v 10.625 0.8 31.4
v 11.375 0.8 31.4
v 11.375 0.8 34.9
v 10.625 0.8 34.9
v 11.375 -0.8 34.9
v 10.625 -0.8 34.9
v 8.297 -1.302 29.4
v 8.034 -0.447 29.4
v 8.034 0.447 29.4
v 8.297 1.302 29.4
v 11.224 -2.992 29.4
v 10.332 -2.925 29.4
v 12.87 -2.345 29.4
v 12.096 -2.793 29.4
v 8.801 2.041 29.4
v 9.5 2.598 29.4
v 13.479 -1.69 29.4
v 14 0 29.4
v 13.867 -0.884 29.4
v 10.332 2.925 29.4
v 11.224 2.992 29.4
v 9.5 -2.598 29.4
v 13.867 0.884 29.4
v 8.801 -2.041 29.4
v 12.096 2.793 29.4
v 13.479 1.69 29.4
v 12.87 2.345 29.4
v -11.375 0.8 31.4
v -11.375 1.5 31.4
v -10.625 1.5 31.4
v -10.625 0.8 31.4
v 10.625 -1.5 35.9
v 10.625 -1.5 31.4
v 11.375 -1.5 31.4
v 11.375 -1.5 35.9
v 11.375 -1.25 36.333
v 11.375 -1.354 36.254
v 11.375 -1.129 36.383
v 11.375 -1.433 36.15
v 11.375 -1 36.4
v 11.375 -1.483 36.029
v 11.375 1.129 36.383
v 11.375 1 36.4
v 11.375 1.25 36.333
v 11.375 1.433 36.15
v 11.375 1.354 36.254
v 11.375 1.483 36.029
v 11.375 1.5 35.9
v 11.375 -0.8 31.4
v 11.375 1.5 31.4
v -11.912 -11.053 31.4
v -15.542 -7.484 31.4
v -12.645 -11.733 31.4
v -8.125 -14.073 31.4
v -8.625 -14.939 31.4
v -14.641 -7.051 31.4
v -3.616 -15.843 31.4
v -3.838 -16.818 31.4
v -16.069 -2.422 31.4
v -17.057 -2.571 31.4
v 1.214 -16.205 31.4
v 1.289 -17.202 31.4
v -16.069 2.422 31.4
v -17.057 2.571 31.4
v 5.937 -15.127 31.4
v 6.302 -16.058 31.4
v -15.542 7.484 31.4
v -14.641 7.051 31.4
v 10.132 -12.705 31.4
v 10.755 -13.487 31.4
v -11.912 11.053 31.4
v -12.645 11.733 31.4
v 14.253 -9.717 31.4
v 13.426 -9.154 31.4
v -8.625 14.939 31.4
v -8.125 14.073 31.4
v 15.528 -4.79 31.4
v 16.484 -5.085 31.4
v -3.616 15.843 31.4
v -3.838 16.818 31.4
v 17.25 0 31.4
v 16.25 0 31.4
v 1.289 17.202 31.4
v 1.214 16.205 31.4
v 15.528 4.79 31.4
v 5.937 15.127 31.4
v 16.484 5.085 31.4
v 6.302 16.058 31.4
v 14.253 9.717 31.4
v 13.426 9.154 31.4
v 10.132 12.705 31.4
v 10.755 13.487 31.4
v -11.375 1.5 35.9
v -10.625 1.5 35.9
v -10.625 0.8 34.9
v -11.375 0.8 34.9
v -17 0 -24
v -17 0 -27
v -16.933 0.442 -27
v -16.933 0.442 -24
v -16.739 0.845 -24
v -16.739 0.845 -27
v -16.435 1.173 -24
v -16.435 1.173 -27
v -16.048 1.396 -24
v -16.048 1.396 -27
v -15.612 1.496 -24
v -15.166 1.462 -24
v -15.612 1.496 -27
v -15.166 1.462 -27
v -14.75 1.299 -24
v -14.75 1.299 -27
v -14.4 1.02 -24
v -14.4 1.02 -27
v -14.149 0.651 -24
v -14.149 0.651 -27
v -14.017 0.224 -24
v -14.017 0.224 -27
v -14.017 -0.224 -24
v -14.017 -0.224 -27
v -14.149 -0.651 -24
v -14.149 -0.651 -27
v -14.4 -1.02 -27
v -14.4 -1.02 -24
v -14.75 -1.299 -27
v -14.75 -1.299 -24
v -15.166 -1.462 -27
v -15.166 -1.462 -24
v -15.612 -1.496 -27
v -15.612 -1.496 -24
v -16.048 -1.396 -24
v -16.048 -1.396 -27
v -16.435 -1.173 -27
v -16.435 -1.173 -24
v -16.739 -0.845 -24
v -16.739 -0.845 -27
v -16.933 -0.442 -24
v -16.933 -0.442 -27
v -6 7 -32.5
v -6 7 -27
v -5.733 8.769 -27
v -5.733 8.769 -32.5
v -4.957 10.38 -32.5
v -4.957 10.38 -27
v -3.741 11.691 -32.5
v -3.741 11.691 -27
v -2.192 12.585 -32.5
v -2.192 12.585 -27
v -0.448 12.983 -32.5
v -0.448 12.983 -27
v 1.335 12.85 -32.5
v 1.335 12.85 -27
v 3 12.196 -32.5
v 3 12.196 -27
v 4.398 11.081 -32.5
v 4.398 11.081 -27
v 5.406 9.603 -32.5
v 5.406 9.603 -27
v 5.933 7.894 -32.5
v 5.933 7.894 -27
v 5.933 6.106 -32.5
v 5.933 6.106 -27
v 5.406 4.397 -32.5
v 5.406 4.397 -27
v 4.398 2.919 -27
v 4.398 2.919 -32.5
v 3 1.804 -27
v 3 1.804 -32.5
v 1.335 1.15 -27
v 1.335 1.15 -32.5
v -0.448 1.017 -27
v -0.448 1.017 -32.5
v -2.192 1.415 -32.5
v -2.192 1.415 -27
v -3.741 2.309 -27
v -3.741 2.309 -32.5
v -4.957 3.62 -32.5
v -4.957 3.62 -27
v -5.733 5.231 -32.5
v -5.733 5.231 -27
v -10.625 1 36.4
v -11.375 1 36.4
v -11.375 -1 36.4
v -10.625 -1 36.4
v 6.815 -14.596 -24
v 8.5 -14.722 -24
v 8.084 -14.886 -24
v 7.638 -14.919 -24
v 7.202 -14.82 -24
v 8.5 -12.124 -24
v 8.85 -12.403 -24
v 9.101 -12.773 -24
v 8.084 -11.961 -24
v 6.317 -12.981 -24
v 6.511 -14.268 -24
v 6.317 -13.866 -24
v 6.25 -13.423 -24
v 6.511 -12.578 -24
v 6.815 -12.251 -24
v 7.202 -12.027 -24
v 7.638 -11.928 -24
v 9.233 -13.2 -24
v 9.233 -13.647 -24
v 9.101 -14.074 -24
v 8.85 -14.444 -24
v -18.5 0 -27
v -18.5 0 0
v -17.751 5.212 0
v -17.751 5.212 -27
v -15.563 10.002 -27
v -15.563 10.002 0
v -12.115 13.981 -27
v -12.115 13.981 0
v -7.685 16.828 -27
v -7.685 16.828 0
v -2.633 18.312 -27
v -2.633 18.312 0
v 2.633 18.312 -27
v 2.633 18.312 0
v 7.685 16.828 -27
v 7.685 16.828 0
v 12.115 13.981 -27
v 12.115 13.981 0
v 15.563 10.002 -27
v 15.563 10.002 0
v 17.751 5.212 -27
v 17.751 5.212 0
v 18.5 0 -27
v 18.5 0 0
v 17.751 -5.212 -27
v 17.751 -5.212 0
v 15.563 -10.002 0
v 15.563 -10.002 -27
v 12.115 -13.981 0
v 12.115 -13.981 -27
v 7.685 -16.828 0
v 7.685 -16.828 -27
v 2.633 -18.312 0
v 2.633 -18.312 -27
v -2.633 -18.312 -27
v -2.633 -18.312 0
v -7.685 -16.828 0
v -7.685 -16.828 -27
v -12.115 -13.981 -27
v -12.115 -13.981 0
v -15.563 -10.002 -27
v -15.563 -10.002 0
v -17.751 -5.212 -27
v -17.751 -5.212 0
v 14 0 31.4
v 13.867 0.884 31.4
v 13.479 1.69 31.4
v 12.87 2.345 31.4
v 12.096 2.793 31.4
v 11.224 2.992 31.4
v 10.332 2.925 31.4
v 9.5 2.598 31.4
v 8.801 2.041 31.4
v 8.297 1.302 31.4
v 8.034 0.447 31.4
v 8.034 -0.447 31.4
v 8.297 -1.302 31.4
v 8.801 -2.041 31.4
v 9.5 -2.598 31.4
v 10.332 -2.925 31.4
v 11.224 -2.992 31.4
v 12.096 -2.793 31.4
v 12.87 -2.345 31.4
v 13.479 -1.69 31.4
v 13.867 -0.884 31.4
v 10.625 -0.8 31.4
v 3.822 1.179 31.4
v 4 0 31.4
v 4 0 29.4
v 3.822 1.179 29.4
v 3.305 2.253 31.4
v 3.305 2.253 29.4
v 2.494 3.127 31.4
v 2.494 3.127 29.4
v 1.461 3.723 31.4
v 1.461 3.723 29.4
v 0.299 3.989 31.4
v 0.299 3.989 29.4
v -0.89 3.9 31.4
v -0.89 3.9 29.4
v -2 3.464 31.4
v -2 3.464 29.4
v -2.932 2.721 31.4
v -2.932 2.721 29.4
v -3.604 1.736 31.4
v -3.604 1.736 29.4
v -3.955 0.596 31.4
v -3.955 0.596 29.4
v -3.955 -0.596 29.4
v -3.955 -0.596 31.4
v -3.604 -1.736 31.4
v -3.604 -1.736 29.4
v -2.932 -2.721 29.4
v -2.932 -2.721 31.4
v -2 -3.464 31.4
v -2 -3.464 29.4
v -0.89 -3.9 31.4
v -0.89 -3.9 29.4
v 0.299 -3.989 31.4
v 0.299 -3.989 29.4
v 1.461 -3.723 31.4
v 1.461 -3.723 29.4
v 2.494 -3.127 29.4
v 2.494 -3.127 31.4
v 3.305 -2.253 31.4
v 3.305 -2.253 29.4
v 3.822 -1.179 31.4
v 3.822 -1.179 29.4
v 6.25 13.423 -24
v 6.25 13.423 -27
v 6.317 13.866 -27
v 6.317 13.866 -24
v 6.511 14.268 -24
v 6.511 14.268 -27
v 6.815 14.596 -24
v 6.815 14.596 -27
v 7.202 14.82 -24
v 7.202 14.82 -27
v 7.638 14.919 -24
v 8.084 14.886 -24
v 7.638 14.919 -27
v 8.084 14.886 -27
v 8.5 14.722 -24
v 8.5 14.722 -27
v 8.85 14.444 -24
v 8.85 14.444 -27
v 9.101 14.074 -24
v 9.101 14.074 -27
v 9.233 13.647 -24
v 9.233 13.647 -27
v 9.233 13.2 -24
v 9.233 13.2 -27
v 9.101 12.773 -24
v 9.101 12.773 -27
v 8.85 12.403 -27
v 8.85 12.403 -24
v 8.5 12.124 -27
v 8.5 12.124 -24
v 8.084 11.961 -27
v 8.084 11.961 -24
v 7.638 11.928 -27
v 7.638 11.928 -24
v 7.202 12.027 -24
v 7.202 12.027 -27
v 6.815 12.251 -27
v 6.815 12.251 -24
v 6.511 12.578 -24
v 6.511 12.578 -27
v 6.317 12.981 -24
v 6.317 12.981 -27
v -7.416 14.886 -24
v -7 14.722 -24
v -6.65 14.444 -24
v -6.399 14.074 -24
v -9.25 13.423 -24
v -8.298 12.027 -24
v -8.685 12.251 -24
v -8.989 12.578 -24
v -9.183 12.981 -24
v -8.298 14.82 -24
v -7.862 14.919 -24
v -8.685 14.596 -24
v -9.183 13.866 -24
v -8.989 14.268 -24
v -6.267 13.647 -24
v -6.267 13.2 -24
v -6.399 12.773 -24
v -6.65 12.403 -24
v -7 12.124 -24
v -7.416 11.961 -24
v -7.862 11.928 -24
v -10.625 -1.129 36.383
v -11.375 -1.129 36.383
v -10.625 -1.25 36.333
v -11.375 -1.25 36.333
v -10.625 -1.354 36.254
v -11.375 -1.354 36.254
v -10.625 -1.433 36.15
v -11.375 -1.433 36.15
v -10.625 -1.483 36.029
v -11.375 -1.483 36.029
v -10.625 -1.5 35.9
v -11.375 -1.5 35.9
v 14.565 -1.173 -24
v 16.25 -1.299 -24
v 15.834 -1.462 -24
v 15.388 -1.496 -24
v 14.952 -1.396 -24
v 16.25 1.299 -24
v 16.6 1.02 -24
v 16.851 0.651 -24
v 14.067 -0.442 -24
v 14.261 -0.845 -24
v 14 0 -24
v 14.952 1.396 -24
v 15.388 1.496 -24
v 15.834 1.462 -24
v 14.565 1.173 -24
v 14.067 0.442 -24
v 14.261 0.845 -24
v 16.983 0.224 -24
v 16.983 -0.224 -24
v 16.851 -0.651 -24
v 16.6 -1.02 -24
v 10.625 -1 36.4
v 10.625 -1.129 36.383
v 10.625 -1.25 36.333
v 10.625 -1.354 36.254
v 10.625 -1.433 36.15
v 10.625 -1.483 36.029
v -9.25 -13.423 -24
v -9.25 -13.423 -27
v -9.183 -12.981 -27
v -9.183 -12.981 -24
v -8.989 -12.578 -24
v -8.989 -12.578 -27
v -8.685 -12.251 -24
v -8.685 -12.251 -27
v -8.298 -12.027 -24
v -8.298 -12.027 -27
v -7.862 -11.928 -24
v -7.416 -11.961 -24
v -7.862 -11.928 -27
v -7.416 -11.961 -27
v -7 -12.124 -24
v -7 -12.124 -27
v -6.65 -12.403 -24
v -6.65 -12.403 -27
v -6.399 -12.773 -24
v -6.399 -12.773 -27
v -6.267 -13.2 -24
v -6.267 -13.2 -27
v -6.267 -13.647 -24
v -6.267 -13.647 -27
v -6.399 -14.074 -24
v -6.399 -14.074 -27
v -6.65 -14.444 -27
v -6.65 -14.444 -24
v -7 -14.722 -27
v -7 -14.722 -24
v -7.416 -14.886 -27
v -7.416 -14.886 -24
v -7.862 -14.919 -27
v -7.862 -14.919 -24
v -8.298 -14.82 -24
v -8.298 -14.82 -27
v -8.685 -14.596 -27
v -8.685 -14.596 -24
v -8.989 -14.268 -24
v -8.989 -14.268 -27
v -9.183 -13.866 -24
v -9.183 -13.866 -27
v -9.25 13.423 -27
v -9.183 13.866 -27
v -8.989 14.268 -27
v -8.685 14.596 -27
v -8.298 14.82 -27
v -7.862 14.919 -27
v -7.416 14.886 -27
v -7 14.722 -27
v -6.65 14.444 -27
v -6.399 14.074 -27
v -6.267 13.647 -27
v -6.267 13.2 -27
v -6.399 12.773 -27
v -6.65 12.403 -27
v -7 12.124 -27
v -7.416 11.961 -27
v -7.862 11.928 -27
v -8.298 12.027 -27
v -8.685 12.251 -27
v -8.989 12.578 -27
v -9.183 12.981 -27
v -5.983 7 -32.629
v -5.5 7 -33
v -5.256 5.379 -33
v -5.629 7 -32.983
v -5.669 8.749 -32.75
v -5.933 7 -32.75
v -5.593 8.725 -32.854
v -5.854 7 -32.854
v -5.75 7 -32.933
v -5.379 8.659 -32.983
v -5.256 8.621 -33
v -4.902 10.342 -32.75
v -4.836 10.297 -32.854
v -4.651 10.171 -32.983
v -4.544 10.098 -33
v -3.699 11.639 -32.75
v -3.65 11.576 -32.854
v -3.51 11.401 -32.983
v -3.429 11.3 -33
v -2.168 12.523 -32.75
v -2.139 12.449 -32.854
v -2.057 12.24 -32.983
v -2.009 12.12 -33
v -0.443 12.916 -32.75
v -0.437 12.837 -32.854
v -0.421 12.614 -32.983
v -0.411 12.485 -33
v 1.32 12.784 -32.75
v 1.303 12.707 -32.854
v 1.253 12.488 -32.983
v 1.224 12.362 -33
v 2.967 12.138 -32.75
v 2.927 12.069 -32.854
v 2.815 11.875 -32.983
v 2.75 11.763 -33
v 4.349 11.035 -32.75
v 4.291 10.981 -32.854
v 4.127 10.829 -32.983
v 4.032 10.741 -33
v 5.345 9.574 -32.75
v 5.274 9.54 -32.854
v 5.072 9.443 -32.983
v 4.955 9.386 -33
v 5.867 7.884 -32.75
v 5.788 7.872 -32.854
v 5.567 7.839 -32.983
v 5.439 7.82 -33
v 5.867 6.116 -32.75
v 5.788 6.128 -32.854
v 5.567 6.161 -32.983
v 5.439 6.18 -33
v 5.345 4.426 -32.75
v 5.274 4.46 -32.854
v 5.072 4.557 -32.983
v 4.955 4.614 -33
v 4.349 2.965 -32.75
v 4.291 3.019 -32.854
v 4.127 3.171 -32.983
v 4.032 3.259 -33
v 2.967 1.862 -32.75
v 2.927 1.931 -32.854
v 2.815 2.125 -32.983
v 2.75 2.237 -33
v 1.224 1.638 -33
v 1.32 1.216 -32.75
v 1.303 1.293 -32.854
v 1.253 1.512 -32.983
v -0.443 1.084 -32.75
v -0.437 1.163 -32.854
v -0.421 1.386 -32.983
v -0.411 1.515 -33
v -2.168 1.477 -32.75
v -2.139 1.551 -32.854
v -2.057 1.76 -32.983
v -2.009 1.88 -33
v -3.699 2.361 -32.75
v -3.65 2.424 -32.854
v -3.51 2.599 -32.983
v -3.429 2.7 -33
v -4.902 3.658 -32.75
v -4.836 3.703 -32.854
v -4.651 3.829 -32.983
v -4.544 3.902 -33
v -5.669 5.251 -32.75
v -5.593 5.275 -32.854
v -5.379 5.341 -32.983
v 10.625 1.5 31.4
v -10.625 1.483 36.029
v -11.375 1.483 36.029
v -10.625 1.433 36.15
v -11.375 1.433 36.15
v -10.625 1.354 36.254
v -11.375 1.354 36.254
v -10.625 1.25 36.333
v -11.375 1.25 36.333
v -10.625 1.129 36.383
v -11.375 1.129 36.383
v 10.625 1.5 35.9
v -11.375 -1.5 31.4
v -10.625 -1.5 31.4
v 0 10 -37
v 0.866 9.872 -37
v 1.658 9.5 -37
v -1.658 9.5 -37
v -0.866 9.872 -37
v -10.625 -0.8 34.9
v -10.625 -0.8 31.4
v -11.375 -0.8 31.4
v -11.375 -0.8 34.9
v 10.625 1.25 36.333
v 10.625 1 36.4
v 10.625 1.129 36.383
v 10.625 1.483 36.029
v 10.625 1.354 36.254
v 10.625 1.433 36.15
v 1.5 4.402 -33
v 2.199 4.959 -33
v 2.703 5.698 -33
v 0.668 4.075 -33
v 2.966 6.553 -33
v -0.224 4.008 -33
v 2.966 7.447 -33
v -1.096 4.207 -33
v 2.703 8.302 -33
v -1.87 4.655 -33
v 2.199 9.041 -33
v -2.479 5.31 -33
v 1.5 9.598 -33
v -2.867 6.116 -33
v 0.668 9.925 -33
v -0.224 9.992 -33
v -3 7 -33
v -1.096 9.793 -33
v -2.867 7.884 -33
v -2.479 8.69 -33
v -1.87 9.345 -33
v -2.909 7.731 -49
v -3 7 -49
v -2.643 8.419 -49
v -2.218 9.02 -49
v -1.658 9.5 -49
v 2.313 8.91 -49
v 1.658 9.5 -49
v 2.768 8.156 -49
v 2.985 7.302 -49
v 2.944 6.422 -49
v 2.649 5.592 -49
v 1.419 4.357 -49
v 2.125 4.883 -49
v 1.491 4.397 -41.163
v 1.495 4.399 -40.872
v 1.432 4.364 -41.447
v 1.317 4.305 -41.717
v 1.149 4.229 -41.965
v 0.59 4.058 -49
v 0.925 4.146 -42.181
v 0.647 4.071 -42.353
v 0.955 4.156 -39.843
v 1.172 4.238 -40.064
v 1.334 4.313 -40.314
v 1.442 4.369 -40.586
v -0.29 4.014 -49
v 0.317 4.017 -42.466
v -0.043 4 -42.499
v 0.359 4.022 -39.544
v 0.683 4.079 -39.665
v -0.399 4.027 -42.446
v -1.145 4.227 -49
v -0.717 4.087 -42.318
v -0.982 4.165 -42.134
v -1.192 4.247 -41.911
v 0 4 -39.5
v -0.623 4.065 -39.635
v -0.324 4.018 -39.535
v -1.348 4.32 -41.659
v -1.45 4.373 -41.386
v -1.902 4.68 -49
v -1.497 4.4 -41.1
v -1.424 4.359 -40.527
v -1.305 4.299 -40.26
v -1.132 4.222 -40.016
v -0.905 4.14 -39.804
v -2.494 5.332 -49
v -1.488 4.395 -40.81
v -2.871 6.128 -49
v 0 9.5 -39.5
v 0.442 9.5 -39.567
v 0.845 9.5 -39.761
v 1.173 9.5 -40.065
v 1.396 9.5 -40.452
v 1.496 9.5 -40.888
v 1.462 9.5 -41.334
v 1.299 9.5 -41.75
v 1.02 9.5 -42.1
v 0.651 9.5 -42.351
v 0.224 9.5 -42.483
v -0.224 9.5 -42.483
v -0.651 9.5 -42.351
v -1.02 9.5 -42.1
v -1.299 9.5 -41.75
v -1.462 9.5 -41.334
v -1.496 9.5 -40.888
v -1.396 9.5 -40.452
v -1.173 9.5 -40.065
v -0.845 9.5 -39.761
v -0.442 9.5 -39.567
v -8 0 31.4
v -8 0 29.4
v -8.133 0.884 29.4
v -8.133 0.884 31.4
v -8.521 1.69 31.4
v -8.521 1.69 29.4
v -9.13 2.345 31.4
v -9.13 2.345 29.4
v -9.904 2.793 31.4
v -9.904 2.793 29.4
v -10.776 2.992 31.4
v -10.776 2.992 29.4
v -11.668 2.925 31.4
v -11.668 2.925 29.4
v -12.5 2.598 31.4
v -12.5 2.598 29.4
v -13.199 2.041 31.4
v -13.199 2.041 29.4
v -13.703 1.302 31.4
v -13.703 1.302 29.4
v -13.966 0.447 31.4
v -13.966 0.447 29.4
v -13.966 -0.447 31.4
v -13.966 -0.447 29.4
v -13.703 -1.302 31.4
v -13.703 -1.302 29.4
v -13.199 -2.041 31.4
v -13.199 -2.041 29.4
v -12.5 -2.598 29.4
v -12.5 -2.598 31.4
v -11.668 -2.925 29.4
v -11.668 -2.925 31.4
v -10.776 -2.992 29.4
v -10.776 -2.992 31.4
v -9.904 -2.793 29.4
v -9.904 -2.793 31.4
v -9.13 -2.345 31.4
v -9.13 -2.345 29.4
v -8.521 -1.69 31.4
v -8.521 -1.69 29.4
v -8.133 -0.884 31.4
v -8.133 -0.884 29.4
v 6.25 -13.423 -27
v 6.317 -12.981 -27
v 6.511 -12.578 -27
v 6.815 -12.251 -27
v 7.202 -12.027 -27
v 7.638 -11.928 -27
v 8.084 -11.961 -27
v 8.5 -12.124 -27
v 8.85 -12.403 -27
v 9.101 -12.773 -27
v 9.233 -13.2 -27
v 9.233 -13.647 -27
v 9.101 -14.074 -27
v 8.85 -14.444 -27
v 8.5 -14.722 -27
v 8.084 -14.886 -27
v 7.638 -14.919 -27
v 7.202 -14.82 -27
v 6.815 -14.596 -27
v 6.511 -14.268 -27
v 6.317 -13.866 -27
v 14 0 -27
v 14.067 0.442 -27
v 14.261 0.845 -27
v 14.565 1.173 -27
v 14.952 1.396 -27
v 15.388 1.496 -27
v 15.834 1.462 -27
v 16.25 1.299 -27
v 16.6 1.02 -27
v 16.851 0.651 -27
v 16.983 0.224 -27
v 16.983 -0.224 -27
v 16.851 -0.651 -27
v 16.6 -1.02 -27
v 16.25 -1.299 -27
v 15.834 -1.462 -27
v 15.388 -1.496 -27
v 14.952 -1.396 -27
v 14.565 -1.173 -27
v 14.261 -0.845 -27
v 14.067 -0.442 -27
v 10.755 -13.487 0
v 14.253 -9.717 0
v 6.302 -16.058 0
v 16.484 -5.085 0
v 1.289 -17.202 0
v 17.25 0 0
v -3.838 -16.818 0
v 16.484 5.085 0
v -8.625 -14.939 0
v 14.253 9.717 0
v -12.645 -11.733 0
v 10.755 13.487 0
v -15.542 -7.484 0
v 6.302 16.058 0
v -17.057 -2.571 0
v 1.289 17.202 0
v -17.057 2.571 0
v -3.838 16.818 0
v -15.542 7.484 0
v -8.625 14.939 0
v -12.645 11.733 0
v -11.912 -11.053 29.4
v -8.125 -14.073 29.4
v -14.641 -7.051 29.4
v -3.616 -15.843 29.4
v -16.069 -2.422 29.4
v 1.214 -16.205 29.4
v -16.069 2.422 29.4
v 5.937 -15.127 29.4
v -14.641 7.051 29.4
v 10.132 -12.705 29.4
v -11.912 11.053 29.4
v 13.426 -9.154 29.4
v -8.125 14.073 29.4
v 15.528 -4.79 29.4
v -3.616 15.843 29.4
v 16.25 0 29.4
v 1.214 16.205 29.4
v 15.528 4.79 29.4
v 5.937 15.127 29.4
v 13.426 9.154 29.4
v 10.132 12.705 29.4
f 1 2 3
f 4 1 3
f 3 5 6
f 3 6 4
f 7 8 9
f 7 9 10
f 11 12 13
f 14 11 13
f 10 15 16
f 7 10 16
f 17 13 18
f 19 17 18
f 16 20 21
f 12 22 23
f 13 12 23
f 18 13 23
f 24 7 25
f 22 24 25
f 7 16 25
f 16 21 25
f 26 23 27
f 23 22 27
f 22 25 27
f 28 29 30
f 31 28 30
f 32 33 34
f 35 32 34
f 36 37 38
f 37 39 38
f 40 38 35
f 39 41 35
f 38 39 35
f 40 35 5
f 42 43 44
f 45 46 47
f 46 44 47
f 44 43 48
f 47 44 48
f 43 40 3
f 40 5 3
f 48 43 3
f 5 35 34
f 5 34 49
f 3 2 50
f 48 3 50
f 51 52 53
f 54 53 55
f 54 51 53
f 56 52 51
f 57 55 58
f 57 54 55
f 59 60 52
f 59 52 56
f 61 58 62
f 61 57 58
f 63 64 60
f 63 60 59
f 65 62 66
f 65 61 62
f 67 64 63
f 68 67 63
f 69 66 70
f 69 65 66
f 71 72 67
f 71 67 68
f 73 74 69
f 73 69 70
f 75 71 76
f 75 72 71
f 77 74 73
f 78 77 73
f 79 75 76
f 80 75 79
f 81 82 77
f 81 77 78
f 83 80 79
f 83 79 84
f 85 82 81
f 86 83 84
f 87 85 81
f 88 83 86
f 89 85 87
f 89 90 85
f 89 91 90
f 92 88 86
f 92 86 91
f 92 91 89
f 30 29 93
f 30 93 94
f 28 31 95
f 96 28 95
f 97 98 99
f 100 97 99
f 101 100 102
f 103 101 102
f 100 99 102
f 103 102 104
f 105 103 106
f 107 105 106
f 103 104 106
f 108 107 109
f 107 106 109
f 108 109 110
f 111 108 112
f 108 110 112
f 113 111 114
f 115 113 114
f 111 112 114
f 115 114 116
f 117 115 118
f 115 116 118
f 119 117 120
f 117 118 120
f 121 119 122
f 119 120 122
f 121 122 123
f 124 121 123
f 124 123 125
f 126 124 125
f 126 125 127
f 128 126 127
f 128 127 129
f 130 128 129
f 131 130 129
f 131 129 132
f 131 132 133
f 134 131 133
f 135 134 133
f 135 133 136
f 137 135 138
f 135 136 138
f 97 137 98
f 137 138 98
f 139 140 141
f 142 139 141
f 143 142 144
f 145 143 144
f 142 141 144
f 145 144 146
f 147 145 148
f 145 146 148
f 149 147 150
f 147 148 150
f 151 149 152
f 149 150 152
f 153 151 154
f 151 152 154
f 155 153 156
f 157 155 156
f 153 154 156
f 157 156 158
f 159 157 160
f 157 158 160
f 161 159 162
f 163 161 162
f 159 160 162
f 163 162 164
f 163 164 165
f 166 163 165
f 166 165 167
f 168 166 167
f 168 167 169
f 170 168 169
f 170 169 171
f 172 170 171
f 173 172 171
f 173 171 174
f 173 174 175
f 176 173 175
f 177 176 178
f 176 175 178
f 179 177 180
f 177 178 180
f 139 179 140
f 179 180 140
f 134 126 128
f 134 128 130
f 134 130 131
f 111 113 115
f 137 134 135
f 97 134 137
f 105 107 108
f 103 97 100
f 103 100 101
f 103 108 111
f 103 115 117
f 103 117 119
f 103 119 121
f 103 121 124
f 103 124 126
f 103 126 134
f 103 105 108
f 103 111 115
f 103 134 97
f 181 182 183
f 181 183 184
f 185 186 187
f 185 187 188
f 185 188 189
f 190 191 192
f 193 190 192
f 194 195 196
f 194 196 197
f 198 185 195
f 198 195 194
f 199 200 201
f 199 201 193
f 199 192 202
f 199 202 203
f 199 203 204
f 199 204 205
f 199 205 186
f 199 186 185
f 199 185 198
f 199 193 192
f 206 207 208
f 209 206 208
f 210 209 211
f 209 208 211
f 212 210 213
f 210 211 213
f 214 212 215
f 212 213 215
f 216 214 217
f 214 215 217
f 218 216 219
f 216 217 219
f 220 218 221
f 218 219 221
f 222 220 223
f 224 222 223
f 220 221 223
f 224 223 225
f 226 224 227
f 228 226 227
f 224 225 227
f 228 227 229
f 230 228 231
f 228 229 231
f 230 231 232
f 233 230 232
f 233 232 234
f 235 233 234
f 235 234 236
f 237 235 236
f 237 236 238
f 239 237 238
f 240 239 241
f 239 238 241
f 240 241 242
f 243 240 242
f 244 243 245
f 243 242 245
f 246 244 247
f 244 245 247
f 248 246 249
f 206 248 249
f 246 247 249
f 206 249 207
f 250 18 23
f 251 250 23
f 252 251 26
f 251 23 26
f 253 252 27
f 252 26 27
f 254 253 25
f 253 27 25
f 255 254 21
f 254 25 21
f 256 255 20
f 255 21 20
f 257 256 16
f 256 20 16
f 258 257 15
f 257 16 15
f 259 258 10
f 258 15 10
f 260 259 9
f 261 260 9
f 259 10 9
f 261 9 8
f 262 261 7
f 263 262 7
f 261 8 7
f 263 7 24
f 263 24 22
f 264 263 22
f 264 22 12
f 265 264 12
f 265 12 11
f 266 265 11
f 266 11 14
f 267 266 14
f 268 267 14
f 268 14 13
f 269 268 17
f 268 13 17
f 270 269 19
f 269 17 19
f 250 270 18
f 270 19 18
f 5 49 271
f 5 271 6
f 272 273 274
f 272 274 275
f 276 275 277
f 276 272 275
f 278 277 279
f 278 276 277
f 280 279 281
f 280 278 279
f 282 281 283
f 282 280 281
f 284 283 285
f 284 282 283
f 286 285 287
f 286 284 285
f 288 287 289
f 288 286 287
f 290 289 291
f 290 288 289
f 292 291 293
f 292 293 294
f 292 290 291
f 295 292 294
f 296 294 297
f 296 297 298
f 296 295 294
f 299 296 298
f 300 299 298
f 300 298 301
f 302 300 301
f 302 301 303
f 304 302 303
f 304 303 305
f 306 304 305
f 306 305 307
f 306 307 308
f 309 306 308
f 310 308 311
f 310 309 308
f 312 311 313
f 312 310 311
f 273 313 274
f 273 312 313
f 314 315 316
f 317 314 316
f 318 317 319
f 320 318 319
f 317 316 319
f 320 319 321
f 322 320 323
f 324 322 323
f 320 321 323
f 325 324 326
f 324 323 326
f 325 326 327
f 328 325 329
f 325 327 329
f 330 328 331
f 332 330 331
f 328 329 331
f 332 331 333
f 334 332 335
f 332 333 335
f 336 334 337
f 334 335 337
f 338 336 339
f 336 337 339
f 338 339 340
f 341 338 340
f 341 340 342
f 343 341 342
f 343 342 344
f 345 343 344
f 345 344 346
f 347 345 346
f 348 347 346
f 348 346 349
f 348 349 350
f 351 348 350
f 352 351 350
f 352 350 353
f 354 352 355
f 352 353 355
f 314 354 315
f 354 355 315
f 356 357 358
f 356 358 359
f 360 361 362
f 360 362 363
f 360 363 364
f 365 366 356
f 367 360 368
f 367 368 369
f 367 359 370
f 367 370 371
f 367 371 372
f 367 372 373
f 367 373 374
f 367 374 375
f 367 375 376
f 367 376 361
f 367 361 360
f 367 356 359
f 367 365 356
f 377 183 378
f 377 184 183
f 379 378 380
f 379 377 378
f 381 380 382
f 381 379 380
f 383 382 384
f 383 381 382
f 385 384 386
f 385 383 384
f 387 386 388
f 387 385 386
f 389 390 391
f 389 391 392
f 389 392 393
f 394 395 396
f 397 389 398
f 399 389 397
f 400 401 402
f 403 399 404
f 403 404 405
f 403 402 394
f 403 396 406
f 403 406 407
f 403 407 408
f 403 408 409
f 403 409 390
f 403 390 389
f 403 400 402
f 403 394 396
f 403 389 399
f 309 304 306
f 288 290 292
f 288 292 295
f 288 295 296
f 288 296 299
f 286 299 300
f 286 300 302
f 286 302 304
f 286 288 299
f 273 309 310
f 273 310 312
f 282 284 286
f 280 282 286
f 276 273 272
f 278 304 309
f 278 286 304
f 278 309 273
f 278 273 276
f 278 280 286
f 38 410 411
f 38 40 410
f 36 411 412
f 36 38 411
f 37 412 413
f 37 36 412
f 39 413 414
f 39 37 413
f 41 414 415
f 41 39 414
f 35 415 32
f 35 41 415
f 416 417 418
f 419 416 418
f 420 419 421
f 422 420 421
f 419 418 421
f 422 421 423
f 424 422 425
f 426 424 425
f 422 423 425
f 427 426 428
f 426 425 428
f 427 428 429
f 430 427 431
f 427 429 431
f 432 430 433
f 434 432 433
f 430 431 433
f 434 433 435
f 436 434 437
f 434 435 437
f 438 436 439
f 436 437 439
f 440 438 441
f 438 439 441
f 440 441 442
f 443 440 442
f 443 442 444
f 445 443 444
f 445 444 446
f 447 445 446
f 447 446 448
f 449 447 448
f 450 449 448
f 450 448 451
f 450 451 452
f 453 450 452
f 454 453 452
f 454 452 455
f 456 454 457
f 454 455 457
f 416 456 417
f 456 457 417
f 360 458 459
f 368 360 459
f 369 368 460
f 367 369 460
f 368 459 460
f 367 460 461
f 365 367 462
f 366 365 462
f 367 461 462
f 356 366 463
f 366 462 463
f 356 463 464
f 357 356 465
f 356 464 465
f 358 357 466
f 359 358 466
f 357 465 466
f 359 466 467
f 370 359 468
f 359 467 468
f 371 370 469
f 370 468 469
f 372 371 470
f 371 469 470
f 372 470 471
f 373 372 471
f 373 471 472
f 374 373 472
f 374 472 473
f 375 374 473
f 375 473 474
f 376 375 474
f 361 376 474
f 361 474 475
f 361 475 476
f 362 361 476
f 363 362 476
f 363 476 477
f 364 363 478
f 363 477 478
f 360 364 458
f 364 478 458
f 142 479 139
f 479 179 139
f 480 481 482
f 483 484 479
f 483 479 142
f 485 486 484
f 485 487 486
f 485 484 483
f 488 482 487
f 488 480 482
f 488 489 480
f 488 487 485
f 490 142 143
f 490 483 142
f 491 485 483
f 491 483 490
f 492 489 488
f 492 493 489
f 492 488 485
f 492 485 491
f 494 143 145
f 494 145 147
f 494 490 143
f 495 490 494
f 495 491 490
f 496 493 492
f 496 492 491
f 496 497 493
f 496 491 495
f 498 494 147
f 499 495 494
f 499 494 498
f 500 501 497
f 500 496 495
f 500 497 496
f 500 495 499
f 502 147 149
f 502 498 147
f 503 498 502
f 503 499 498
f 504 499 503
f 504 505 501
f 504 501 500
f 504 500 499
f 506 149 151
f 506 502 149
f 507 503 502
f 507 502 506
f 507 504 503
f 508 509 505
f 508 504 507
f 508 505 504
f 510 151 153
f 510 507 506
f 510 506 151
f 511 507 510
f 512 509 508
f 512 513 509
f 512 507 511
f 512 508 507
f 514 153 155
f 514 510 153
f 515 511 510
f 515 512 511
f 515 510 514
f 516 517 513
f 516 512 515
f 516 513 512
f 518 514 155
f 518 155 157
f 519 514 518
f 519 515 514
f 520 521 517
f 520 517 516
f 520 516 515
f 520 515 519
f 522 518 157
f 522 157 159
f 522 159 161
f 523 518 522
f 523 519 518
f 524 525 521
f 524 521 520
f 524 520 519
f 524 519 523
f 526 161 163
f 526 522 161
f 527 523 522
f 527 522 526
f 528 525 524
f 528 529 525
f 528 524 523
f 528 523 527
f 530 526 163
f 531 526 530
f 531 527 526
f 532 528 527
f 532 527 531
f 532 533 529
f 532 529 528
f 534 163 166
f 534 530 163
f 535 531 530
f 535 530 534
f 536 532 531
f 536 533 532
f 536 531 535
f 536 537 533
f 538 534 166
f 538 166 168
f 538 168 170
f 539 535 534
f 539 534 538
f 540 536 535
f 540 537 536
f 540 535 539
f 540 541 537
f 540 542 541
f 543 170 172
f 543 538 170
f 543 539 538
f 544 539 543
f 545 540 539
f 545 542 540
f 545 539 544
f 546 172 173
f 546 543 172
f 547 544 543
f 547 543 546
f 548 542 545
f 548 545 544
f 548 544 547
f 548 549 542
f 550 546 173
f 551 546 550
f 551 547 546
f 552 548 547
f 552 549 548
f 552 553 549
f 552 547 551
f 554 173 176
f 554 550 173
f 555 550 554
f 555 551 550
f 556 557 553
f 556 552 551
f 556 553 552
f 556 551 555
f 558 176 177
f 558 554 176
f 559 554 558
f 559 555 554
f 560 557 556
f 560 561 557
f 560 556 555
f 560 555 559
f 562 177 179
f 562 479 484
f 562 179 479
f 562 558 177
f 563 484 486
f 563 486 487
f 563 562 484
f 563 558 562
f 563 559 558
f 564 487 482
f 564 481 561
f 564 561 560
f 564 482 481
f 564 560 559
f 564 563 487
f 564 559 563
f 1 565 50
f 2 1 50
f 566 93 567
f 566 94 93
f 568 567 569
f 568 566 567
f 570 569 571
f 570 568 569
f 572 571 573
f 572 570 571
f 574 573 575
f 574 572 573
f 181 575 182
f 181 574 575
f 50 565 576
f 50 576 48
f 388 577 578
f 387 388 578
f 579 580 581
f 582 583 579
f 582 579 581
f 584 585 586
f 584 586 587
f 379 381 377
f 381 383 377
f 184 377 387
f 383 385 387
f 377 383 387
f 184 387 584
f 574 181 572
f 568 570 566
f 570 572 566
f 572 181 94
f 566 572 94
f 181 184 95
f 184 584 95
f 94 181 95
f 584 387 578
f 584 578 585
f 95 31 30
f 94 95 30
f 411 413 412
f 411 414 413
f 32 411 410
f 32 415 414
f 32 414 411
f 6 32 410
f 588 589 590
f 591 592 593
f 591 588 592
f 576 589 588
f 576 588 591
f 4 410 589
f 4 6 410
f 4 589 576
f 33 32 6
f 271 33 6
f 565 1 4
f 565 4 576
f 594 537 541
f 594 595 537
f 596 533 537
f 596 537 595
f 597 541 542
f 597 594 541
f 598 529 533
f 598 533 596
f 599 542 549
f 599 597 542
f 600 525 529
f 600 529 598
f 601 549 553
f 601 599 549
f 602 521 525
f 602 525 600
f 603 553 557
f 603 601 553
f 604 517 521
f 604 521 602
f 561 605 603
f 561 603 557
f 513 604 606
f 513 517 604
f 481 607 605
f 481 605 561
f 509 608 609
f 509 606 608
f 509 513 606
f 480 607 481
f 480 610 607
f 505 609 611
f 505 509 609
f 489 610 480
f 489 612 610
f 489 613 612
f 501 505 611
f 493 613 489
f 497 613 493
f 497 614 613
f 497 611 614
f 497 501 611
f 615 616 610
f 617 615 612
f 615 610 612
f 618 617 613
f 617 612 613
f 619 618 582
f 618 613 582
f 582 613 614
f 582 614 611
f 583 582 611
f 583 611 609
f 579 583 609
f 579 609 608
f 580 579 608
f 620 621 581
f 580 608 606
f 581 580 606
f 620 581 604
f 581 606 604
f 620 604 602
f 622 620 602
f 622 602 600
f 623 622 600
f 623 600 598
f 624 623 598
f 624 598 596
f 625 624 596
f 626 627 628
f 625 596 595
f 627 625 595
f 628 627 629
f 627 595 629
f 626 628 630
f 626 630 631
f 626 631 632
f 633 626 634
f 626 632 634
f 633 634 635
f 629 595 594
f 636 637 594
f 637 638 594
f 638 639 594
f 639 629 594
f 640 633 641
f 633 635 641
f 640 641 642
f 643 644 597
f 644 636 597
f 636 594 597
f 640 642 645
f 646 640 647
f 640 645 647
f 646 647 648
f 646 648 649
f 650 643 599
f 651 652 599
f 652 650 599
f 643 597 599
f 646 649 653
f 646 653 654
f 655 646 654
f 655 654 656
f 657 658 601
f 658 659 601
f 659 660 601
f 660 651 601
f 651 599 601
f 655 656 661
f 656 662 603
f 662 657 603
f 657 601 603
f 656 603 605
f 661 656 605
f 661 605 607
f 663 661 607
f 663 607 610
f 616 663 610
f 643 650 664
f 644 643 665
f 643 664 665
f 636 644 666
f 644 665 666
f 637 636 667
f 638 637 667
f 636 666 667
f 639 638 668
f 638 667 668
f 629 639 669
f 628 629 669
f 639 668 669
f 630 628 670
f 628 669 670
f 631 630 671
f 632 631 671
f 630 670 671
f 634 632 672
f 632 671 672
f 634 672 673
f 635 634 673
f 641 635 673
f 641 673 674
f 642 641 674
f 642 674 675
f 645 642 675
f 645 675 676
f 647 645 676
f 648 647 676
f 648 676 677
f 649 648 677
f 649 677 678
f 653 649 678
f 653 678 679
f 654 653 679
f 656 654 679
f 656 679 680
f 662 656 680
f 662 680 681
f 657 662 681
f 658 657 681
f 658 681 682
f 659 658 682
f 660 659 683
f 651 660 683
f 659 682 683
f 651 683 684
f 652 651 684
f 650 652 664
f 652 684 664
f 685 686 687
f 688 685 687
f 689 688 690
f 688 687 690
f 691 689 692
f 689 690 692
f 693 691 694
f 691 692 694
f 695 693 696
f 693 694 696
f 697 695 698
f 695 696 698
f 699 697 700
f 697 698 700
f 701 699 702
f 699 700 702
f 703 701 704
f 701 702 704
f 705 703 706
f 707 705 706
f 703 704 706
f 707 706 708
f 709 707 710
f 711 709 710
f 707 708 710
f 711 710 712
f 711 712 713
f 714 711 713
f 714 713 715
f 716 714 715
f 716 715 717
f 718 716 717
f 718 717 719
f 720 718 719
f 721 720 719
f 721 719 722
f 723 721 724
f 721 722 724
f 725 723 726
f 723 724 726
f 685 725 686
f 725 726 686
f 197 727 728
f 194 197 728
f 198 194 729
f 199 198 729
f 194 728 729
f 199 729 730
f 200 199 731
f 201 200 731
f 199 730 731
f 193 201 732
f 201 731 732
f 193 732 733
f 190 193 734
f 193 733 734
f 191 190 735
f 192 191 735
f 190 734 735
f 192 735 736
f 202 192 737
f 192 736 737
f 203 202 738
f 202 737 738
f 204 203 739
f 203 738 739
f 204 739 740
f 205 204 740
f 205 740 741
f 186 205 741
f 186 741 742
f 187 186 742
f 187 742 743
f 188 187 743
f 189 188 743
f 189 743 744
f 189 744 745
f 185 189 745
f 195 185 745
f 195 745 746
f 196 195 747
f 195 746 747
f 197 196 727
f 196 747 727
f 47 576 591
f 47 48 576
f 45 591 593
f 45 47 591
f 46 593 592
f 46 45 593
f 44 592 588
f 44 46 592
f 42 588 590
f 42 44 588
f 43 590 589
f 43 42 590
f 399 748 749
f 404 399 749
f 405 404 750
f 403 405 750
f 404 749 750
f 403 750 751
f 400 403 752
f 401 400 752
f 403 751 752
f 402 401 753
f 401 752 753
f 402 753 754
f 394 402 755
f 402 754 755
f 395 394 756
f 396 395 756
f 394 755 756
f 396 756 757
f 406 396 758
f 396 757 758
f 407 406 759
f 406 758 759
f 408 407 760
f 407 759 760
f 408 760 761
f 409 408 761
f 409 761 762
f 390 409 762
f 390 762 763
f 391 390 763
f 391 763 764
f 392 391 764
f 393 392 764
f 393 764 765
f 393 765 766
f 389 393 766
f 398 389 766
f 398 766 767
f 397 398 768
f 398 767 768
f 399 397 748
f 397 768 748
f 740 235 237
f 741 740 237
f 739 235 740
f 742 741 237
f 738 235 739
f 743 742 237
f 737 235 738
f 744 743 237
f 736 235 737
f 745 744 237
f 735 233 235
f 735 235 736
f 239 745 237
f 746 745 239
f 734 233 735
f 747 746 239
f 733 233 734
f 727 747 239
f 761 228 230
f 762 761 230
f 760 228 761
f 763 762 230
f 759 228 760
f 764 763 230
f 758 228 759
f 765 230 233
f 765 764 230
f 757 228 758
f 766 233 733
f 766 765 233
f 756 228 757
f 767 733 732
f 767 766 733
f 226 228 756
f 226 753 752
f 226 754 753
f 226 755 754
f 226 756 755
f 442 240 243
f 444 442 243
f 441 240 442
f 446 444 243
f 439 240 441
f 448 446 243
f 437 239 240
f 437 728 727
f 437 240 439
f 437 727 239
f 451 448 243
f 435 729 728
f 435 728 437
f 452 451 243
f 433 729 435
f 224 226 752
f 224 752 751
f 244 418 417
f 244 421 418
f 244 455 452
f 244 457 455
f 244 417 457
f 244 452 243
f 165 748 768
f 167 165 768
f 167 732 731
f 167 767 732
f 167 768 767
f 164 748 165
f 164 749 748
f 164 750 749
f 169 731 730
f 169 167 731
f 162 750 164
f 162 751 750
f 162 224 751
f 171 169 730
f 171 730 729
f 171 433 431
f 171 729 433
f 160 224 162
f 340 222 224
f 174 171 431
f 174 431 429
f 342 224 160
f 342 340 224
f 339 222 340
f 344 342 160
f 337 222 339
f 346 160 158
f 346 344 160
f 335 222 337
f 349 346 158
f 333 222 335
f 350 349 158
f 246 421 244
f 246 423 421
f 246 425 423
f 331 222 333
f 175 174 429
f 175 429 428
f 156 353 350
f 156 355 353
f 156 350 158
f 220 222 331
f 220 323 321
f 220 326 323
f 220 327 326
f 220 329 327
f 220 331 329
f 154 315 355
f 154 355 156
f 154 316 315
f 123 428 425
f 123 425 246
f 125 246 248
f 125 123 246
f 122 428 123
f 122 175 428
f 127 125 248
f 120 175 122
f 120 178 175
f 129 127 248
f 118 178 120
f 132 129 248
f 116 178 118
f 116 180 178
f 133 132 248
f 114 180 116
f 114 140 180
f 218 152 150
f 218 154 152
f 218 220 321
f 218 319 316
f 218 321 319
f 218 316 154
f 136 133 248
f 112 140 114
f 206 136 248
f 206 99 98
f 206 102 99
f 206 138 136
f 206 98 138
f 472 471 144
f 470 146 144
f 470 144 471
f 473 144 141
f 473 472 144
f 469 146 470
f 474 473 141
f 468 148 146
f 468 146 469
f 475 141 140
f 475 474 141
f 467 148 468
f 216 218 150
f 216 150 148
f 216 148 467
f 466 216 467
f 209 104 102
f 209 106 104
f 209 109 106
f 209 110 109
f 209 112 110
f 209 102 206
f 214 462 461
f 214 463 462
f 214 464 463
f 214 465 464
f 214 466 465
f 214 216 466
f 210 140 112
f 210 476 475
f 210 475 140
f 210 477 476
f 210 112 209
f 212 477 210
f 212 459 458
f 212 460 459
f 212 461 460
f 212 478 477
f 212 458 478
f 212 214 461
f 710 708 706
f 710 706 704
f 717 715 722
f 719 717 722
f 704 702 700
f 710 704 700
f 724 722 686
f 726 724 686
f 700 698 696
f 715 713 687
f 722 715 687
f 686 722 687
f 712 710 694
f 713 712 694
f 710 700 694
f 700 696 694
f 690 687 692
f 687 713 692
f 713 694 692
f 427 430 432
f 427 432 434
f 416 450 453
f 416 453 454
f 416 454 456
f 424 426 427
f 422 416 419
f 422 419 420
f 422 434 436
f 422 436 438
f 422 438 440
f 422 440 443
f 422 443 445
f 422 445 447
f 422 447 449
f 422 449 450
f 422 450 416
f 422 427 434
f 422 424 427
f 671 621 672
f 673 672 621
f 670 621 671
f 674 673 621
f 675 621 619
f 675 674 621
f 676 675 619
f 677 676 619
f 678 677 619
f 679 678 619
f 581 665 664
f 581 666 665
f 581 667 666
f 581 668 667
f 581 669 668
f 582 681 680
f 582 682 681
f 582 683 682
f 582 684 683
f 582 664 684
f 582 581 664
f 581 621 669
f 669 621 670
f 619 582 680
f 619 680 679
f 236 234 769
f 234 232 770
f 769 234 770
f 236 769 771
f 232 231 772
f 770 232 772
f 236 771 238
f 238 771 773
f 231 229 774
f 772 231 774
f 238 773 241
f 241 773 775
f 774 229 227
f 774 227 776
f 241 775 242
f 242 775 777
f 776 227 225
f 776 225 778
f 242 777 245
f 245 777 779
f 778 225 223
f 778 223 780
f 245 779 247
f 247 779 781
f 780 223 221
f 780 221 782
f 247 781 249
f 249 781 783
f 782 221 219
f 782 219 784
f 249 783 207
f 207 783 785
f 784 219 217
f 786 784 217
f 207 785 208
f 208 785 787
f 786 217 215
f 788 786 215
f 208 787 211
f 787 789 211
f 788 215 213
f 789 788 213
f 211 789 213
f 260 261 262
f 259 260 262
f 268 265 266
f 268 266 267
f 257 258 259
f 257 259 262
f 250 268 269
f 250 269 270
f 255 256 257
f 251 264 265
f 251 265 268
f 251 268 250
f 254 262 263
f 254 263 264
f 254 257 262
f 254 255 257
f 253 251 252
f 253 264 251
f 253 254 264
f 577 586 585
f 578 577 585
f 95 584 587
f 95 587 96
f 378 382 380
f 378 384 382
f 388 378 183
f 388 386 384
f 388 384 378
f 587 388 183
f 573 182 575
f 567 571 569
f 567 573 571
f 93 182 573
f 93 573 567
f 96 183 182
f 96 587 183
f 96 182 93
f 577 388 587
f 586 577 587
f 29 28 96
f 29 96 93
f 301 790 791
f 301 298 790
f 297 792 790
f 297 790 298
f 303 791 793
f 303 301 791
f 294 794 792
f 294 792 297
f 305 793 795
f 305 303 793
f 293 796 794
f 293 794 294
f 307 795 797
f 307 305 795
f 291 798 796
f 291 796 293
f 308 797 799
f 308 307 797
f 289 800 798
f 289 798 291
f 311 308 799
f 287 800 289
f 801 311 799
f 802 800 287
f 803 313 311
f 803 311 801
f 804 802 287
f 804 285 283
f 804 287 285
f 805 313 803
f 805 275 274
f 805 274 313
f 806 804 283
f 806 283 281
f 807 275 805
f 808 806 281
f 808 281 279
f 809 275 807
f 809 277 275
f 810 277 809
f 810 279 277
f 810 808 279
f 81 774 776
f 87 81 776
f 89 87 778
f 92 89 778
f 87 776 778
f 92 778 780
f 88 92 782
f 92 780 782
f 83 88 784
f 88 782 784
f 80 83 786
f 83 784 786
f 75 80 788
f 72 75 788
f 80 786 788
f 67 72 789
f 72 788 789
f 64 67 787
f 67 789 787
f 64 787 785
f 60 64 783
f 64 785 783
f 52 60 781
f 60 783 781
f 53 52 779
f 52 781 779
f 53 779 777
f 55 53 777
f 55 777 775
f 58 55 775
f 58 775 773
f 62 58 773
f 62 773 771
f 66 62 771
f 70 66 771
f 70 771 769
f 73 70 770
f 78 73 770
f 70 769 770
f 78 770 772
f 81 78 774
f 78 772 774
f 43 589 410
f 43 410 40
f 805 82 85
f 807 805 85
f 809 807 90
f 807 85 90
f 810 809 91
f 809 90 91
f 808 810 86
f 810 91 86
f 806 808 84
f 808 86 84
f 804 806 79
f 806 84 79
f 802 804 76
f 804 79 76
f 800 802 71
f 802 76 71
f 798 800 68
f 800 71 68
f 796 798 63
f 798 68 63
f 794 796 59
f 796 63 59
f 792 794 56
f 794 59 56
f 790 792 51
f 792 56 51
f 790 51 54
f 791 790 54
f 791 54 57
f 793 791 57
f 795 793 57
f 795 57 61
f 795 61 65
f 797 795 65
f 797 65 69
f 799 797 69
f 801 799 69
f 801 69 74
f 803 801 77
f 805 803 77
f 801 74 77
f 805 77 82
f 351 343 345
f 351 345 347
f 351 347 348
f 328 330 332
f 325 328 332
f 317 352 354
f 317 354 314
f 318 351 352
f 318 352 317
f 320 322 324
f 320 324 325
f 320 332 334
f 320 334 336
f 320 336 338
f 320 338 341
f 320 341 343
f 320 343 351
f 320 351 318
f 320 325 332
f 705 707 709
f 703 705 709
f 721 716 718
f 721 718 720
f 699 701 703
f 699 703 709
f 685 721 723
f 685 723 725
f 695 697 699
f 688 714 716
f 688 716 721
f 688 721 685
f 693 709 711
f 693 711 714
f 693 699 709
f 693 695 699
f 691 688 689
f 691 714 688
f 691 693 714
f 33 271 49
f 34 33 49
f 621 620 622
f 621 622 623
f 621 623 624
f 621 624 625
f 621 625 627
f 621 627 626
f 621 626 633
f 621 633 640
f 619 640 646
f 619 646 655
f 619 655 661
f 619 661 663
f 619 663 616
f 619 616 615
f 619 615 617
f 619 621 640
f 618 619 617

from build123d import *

# Parameters (mm, degrees)
CROQUIS1_R                = 17.25
SALIENTE_EXTRUIR1_DEPTH   = 31.4
CROQUIS2_R                = 18.5
SALIENTE_EXTRUIR2_DEPTH   = 27
CROQUIS3_R                = 6
SALIENTE_EXTRUIR3_DEPTH   = 6
CROQUIS4_R                = 3
SALIENTE_EXTRUIR4_DEPTH   = 16
CORTAR_EXTRUIR1_START     = -12
CORTAR_EXTRUIR1_DEPTH     = 12
CROQUIS8_R                = 16.25
CROQUIS8_R_2              = 4
CORTAR_EXTRUIR2_DEPTH     = 2
CROQUIS9_R                = 3
SALIENTE_EXTRUIR5_DEPTH   = 2
SALIENTE_EXTRUIR5_2_DEPTH = 2
CROQUIS10_W               = 0.75
CROQUIS10_H               = 3
SALIENTE_EXTRUIR6_DEPTH   = 5
SALIENTE_EXTRUIR6_2_DEPTH = 5
CORTAR_EXTRUIR3_START     = -25.375
CROQUIS11_W               = 3.5
CROQUIS11_H               = 1.6
CORTAR_EXTRUIR3_DEPTH     = 28
REDONDEO1_R               = 0.5
REDONDEO2_R               = 0.5
REDONDEO3_R               = 0.5
CROQUIS12_R               = 1.5
CORTAR_EXTRUIR4_DEPTH     = 3
CUT_EXTRUDE1_REACH        = 61.391
CUT_EXTRUDE1_END_RADIUS   = 3
SKETCH1_R                 = 1.5


with BuildPart() as part:
    # Croquis1 → Saliente-Extruir1 (new body)
    with BuildSketch(Plane.XY):
        Circle(CROQUIS1_R)
    extrude(amount=SALIENTE_EXTRUIR1_DEPTH)

    # Croquis2 → Saliente-Extruir2 (add)
    with BuildSketch(Plane(origin=(0, 0, 0), x_dir=(-1, 0, 0), z_dir=(0, 0, -1))):
        Circle(CROQUIS2_R)
    extrude(amount=SALIENTE_EXTRUIR2_DEPTH)

    # Croquis3 → Saliente-Extruir3 (add)
    with BuildSketch(Plane(origin=(0, 0, -27), x_dir=(-1, 0, 0), z_dir=(0, 0, -1))):
        with Locations((0, 7)):
            Circle(CROQUIS3_R)
    extrude(amount=SALIENTE_EXTRUIR3_DEPTH)

    # Croquis4 → Saliente-Extruir4 (add)
    with BuildSketch(Plane(origin=(0, 0, -33), x_dir=(-1, 0, 0), z_dir=(0, 0, -1))):
        with Locations((0, 7)):
            Circle(CROQUIS4_R)
    extrude(amount=SALIENTE_EXTRUIR4_DEPTH)

    # Croquis5 → Cortar-Extruir1 (cut)
    with BuildSketch(Plane(origin=(0, 0, -49), x_dir=(-1, 0, 0), z_dir=(0, 0, -1)).offset(CORTAR_EXTRUIR1_START)):
        with BuildLine():
            Line((-1.658312395, 9.5), (1.658312395, 9.5))
            ThreePointArc((1.658312395, 9.5), (0, 10), (-1.658312395, 9.5))
        make_face()
    extrude(amount=CORTAR_EXTRUIR1_DEPTH, mode=Mode.SUBTRACT)

    # Croquis8 → Cortar-Extruir2 (cut)
    with BuildSketch(Plane.XY.offset(31.4)):
        Circle(CROQUIS8_R)
        Circle(CROQUIS8_R_2, mode=Mode.SUBTRACT)
    extrude(amount=-CORTAR_EXTRUIR2_DEPTH, mode=Mode.SUBTRACT)

    # Redondeo3
    redondeo3_edges = [part.edges().sort_by_distance(p)[0] for p in [
        (6, 7, -33),
    ]]
    fillet(redondeo3_edges, radius=REDONDEO3_R)

    # Croquis12 → Cortar-Extruir4 (cut)
    with BuildSketch(Plane(origin=(0, 0, -27), x_dir=(-1, 0, 0), z_dir=(0, 0, -1))):
        with Locations((-15.5, 0)):
            Circle(CROQUIS12_R)
        with Locations((-7.75, 13.423393759)):
            Circle(CROQUIS12_R)
        with Locations((7.75, 13.423393759)):
            Circle(CROQUIS12_R)
        with Locations((15.5, 0)):
            Circle(CROQUIS12_R)
        with Locations((7.75, -13.423393759)):
            Circle(CROQUIS12_R)
        with Locations((-7.75, -13.423393759)):
            Circle(CROQUIS12_R)
    extrude(amount=-CORTAR_EXTRUIR4_DEPTH, mode=Mode.SUBTRACT)

    # Cut-Extrude1: up to this cylinder (the profile starts inside it)
    cut_extrude1_end = Plane(origin=(0, 7, -41), z_dir=(0, 0, 1)) * Cylinder(CUT_EXTRUDE1_END_RADIUS, 129.782, mode=Mode.PRIVATE)
    # Sketch1 → Cut-Extrude1 (cut, up to the surface)
    with BuildSketch(Plane(origin=(0, 9.5, 0), x_dir=(1, 0, 0), z_dir=(0, 1, 0)), mode=Mode.PRIVATE) as cut_extrude1_sk1:
        with Locations(Location((0, 41, 0), (0, 0, 270))):
            Circle(SKETCH1_R)
    cut_extrude1_tool1 = extrude(cut_extrude1_sk1.sketch, amount=-CUT_EXTRUDE1_REACH, mode=Mode.PRIVATE) & cut_extrude1_end
    add(cut_extrude1_tool1.solids().sort_by_distance((0, 9.5, -41))[0], mode=Mode.SUBTRACT)


with BuildPart() as body_2:
    # Croquis9 → Saliente-Extruir5 (new body)
    with BuildSketch(Plane.XY.offset(29.4)):
        with Locations((-11, 0)):
            Circle(CROQUIS9_R)
    extrude(amount=SALIENTE_EXTRUIR5_DEPTH)


with BuildPart() as body_3:
    # Croquis9 → Saliente-Extruir5 2 (new body)
    with BuildSketch(Plane.XY.offset(29.4)):
        with Locations((11, 0)):
            Circle(CROQUIS9_R)
    extrude(amount=SALIENTE_EXTRUIR5_2_DEPTH)


with BuildPart() as body_4:
    # Croquis10 → Saliente-Extruir6 (new body)
    with BuildSketch(Plane.XY.offset(31.4)):
        with Locations((-11, 0)):
            Rectangle(CROQUIS10_W, CROQUIS10_H)
    extrude(amount=SALIENTE_EXTRUIR6_DEPTH)


with BuildPart() as body_5:
    # Croquis10 → Saliente-Extruir6 2 (new body)
    with BuildSketch(Plane.XY.offset(31.4)):
        with Locations((11, 0)):
            Rectangle(CROQUIS10_W, CROQUIS10_H)
    extrude(amount=SALIENTE_EXTRUIR6_2_DEPTH)


with BuildPart() as cortar_extruir3_tool:
    # Croquis11 → Cortar-Extruir3 (new body)
    with BuildSketch(Plane.ZY.offset(11.375).offset(CORTAR_EXTRUIR3_START)):
        with Locations((33.15, 0)):
            Rectangle(CROQUIS11_W, CROQUIS11_H)
    extrude(amount=CORTAR_EXTRUIR3_DEPTH)


with BuildPart() as body_4_1:
    add(body_4.part)

    # Cortar-Extruir3: cut by cortar_extruir3_tool
    add(cortar_extruir3_tool.part, mode=Mode.SUBTRACT)

    # Redondeo1
    redondeo1_edges = [body_4_1.edges().sort_by_distance(p)[0] for p in [
        (-11, 1.5, 36.4),
        (-11, -1.5, 36.4),
    ]]
    fillet(redondeo1_edges, radius=REDONDEO1_R)


with BuildPart() as body_5_1:
    add(body_5.part)

    # Cortar-Extruir3: cut by cortar_extruir3_tool
    add(cortar_extruir3_tool.part, mode=Mode.SUBTRACT)

    # Redondeo2
    redondeo2_edges = [body_5_1.edges().sort_by_distance(p)[0] for p in [
        (11, 1.5, 36.4),
        (11, -1.5, 36.4),
    ]]
    fillet(redondeo2_edges, radius=REDONDEO2_R)


solid = Compound([part.part, body_2.part, body_3.part, body_4_1.part, body_5_1.part])
